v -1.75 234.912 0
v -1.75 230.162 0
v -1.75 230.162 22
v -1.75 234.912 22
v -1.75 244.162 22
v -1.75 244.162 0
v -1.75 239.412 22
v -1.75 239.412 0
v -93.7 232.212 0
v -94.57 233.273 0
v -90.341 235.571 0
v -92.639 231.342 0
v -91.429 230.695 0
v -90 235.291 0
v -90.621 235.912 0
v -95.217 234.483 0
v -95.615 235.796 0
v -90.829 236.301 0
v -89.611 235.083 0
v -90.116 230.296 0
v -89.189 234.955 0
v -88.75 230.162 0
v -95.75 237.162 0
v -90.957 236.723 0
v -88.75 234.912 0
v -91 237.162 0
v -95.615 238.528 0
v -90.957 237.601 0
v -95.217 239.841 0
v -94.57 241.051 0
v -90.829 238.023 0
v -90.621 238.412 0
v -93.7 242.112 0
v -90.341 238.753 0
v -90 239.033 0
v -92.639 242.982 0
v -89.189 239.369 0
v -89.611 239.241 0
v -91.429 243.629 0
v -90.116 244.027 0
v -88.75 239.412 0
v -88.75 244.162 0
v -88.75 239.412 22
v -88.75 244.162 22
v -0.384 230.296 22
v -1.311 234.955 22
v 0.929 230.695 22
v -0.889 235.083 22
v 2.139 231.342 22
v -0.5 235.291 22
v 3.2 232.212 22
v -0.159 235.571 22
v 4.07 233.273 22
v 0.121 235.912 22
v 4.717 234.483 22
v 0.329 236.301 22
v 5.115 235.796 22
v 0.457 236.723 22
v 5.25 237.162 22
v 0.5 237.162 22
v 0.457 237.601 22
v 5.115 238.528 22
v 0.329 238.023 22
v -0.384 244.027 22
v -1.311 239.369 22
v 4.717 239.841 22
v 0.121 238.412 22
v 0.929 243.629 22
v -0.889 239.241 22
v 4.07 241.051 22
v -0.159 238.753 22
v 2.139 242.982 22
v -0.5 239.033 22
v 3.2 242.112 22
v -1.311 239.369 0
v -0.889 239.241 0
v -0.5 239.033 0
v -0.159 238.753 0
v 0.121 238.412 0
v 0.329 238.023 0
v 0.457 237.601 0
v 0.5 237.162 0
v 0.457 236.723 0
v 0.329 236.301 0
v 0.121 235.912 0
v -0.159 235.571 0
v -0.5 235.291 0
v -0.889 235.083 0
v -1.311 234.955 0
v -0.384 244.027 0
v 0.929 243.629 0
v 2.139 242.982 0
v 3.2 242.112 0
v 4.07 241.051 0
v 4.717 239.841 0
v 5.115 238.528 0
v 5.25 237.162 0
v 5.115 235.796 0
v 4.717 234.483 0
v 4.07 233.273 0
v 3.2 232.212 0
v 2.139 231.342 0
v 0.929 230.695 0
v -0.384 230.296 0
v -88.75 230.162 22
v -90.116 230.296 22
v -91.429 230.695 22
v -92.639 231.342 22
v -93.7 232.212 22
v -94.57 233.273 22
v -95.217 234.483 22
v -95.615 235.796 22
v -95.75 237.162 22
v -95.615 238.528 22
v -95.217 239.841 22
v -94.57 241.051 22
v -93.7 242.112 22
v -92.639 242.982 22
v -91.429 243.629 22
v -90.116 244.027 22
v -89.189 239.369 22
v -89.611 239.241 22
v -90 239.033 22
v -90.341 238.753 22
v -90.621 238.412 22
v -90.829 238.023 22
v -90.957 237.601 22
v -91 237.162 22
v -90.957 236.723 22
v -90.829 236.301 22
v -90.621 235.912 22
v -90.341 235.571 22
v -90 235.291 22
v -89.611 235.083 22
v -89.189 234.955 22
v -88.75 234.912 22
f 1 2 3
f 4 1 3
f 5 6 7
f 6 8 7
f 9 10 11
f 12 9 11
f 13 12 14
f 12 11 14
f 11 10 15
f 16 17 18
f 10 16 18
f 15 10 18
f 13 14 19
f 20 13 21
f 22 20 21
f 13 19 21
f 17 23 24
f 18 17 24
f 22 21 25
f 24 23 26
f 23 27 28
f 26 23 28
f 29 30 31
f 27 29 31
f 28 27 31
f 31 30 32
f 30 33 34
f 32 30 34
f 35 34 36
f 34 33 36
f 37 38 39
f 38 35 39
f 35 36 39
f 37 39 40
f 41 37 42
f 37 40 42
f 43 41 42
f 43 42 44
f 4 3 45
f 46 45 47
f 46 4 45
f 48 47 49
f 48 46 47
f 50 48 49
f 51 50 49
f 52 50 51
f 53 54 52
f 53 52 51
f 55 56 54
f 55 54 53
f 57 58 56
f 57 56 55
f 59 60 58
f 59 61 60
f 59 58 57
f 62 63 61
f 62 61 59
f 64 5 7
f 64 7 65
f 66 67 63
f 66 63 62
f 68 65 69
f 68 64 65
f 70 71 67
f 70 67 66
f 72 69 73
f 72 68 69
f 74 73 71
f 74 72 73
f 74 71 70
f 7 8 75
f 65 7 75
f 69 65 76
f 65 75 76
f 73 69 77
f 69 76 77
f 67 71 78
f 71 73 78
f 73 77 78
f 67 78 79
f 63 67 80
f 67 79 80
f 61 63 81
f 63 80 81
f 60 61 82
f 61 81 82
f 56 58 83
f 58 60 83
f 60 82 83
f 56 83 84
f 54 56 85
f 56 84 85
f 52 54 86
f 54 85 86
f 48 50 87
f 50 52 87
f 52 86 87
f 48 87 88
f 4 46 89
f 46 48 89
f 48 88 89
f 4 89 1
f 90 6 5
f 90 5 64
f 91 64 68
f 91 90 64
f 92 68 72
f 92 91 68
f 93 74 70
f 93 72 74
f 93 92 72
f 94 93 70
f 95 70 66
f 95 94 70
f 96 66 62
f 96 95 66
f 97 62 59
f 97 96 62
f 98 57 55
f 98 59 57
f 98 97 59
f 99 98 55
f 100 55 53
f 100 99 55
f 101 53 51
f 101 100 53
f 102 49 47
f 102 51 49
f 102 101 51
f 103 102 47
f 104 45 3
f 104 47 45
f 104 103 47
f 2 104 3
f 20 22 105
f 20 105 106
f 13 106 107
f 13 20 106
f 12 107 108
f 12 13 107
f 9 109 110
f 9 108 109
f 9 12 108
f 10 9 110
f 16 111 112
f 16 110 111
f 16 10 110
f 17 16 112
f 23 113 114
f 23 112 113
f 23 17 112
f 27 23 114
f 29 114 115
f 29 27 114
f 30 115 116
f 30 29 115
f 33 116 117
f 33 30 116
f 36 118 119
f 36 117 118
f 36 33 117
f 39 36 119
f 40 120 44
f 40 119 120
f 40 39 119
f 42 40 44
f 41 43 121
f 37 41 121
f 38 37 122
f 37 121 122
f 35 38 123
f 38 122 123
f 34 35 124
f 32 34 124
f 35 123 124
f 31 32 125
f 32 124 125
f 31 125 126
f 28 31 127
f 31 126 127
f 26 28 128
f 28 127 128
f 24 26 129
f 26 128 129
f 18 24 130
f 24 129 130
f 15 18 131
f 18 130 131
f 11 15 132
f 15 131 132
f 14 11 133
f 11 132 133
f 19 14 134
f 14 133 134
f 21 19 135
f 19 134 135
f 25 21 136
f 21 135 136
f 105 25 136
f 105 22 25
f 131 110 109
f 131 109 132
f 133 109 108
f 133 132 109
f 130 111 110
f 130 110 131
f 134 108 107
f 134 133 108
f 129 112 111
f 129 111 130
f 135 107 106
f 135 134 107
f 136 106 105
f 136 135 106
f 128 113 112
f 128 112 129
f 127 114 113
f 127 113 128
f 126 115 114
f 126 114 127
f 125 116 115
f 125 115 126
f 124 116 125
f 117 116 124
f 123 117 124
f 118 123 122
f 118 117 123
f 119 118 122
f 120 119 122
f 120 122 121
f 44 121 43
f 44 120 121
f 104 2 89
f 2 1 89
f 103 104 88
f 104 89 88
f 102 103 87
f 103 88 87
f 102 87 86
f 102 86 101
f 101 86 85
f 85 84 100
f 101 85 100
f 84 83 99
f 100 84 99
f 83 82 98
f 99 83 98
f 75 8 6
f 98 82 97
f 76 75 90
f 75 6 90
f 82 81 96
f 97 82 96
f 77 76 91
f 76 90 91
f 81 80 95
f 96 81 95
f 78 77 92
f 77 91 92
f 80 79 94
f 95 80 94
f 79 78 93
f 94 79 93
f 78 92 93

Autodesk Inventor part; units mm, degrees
ref_plane "YZ Plane" through (0, 0, 0) normal (1, 0, 0) x (0, 1, 0)
ref_plane "XZ Plane" through (0, 0, 0) normal (0, 1, 0) x (-1, 0, 0)
sketch "Sketch1" plane through (0, 0, 0) normal (0, 0, 1) x (1, 0, 0)
  circle A0 centre (-88.75, 237.1619) radius 2 projected
  circle A1 centre (-45.25, 302.7734) radius 2 projected
  circle A2 centre (-88.75, 302.7734) radius 2 projected
  circle A3 centre (-45.25, 237.1619) radius 2 projected
  circle A4 centre (-46.75, 361.06) radius 2 projected
  circle A5 centre (-40.75, 400) radius 23.3333 projected
  line L0 (-53.25, 186.7791) -> (-53.25, -39) projected
  arc A6 (-53.25, -39) -> (-46.25, -46) centre (-46.25, -39) ccw projected
  line L1 (1.25, -46) -> (-46.25, -46) projected
  arc A7 (1.25, -46) -> (8.9167, 45.3566) centre (1.25, 0) ccw projected
  arc A8 (7.25, 47.3287) -> (8.9167, 45.3566) centre (9.25, 47.3287) ccw projected
  line L2 (7.25, 400) -> (7.25, 47.3287) projected
  arc A9 (7.25, 400) -> (-27.0387, 446) centre (-40.75, 400) ccw projected
  line L3 (-85.75, 446) -> (-27.0387, 446) projected
  circle A10 centre (-85.75, 438.7) radius 2 projected
  circle A11 centre (-85.75, 361.06) radius 2 projected
  circle A12 centre (-46.75, 438.7) radius 2 projected
  circle A13 centre (10.9583, -29.879) radius 2.1 projected
  circle A14 centre (32.6667, 0) radius 2.1 projected
  circle A15 centre (-24.1666, -18.4662) radius 2.1 projected
  circle A16 centre (10.9583, 29.8791) radius 2.1 projected
  circle A17 centre (-24.1666, 18.4663) radius 2.1 projected
  circle A18 centre (1.25, 0) radius 23.3333 projected
  circle A19 centre (-1.75, 302.7734) radius 2.25 projected
  circle A20 centre (-1.75, 237.1619) radius 2.25 projected
  circle A21 centre (-43.75, 127.6736) radius 2 projected
  circle A22 centre (-4.75, -38.7) radius 2 projected
  circle A23 centre (-4.75, 38.94) radius 2 projected
  circle A24 centre (-4.75, 127.6736) radius 2 projected
  circle A25 centre (-43.75, -38.7) radius 2 projected
  circle A26 centre (-43.75, 38.94) radius 2 projected
  line L4 (-88.75, 237.1619) -> (-95.75, 237.1619)
  line L5 (-1.75, 237.1619) -> (5.25, 237.1619)
  circle A27 centre (-88.75, 237.1619) radius 7
  circle A28 centre (-1.75, 237.1619) radius 7
  line L6 (-88.75, 230.1619) -> (-1.75, 230.1619)
  line L7 (-88.75, 244.1619) -> (-1.75, 244.1619)
  circle A29 centre (-9.3333, 400) radius 2.1 projected
  circle A30 centre (-31.0417, 429.8791) radius 2.1 projected
  circle A31 centre (-31.0417, 370.121) radius 2.1 projected
  circle A32 centre (-66.1666, 418.4663) radius 2.1 projected
  circle A33 centre (-66.1666, 381.5338) radius 2.1 projected
  arc A34 (-95.75, 226.7791) -> (-85.75, 216.7791) centre (-85.75, 226.7791) ccw projected
  line L8 (-85.75, 216.7791) -> (-83.25, 216.7791) projected
  arc A35 (-53.25, 186.7791) -> (-83.25, 216.7791) centre (-83.25, 186.7791) ccw projected
  arc A36 (-85.75, 446) -> (-95.75, 436) centre (-85.75, 436) ccw projected
  line L9 (-95.75, 226.7791) -> (-95.75, 436) projected
  point P0 (0, 0)
  dimension "d0" = 7
  dimension "d1" = 7
ref_plane "Work Plane1" through (-48.25, 120.3736, 22.5) normal (0, 0, -1) x (0, 1, 0)
extrude "Extrusion1" add sketch "Sketch1" along normal up to surface (22.5 mm away) contours A27 | L7 A28 L6 A27 | A28
sketch "Sketch2" plane through (-88.75, 230.1619, 0) normal (0, -1, 0) x (1, 0, 0)
  line L0 (0, 22.5) -> (87, 22.5) projected
  line L1 (0, 0) -> (0, 22.5) projected
  line L2 (0, 0) -> (87, 0) projected
  line L3 (87, 0) -> (87, 22.5) projected
  circle A0 centre (64.5, 22.5) radius 16 projected
  circle A1 centre (22.5, 22.5) radius 16 projected
  point P0 (88.75, 0)
  point P1 (80.5, 22.5)
  point P2 (48.5, 22.5)
  point P3 (0, 12.2811)
  point P4 (38.5, 22.5)
  point P5 (6.5, 22.5)
extrude "Extrusion2" cut sketch "Sketch2" against normal through all contours A0 L0 | L0 L3 L2 L1 A1 A0 | A1 L0 | L0 A1 picked at (67.5775, 12.7002)
sketch "Szkic3" plane through (-88.75, 237.1619, 22.5) normal (0, 0, 1) x (1, 0, 0)
  arc A0 (0, 7) -> (0, -7) centre (0, 0) ccw projected
  arc A1 (0, 2) -> (0, -2) centre (0, 0) ccw projected
  line L0 (48.7838, -7) -> (48.7838, 7) projected
  line L1 (48.7838, 7) -> (26.823, 7) projected
  line L2 (26.823, 7) -> (26.823, -7) projected
  line L3 (26.823, -7) -> (48.7838, -7) projected
  circle A2 centre (43.5, 0) radius 2 projected
  arc A3 (87, -7) -> (87, 7) centre (87, 0) ccw projected
  arc A4 (87, -2.25) -> (87, 2.25) centre (87, 0) ccw projected
  arc A5 (0, 2) -> (0, -2) centre (0, 0) ccw projected
  circle A6 centre (0, 0) radius 2.25
  circle A7 centre (43.5, 0) radius 2 projected
  circle A8 centre (43.5, 0) radius 2.25
  arc A9 (87, -7) -> (87, -7) centre (87, 0) ccw projected
  circle A10 centre (87, 0) radius 2.25
  arc A11 (0, 2) -> (0, -2) centre (0, 0) ccw projected
  arc A12 (0, 7) -> (0, -7) centre (0, 0) ccw projected
  line L4 (0, -7) -> (0, -2) projected
  line L5 (0, 2) -> (0, 7) projected
  arc A13 (87, -7) -> (87, 7) centre (87, 0) ccw projected
  line L6 (0, -7) -> (0, -2) projected
  line L7 (0, 2) -> (0, 7) projected
  line L8 (87, 7) -> (87, 2.25) projected
  arc A14 (87, -2.25) -> (87, 2.25) centre (87, 0) ccw projected
  line L9 (87, -2.25) -> (87, -7) projected
  line L10 (87, 7) -> (87, 2.25) projected
  line L11 (87, -2.25) -> (87, -7) projected
  point P0 (88.75, -237.1619)
  dimension "d6" = 4.5
  dimension "d7" = 4.5
  dimension "d8" = 4.5
extrude "Wyciągnięcie proste3" cut sketch "Szkic3" against normal through all contours L5 A1 L4 A6 | A6 L4 A1 L5 | A2 | A8
sketch "Szkic4" plane through (-88.75, 237.1619, 22.5) normal (0, 0, 1) x (1, 0, 0)
  arc A0 (0, 2.25) -> (0, -2.25) centre (0, 0) ccw projected
  arc A1 (0, 7) -> (0, -7) centre (0, 0) ccw projected
  circle A2 centre (43.5, 0) radius 2.25 projected
  line L0 (48.7838, -7) -> (48.7838, 7) projected
  line L1 (48.7838, 7) -> (26.823, 7) projected
  line L2 (26.823, 7) -> (26.823, -7) projected
  line L3 (26.823, -7) -> (48.7838, -7) projected
  arc A3 (87, -7) -> (87, 7) centre (87, 0) ccw projected
  arc A4 (87, -2.25) -> (87, 2.25) centre (87, 0) ccw projected
  arc A5 (0, 2.25) -> (0, -2.25) centre (0, 0) ccw projected
  arc A6 (0, 7) -> (0, -7) centre (0, 0) ccw projected
  line L4 (0, 2.25) -> (0, 7) projected
  line L5 (0, -7) -> (0, -2.25) projected
  arc A7 (87, -7) -> (87, 7) centre (87, 0) ccw projected
  line L6 (0, 2.25) -> (0, 7) projected
  line L7 (0, -7) -> (0, -2.25) projected
  line L8 (87, 7) -> (87, 2.25) projected
  line L9 (87, -2.25) -> (87, -7) projected
  line L10 (87, 7) -> (87, 2.25) projected
  arc A8 (87, -2.25) -> (87, 2.25) centre (87, 0) ccw projected
  line L11 (87, -2.25) -> (87, -7) projected
  point P0 (88.75, -237.1619)
extrude "Wyciągnięcie proste4" cut sketch "Szkic4" against normal blind 0.5 contours A0 L5 A1 L4 | A2 | L3 L2 L1 L0 | L9 A4 L8 A3
sketch "Szkic5" plane through (-32.9445, 229.8104, 22.5) normal (-1, 0, 0) x (0, 0, -1)
  line L0 (0, -0.3515) -> (0, -14.3515) projected
  line L1 (0, -0.3515) -> (0.5, -0.3515) projected
  line L2 (0.5, -14.3515) -> (0.5, -0.3515) projected
  line L3 (0.5, -14.3515) -> (0, -14.3515) projected
  point P0 (22.5, 229.8104)
extrude "Wyciągnięcie proste5" [suppressed]
properties part number "Uchwyt_silnika_podwojny"
